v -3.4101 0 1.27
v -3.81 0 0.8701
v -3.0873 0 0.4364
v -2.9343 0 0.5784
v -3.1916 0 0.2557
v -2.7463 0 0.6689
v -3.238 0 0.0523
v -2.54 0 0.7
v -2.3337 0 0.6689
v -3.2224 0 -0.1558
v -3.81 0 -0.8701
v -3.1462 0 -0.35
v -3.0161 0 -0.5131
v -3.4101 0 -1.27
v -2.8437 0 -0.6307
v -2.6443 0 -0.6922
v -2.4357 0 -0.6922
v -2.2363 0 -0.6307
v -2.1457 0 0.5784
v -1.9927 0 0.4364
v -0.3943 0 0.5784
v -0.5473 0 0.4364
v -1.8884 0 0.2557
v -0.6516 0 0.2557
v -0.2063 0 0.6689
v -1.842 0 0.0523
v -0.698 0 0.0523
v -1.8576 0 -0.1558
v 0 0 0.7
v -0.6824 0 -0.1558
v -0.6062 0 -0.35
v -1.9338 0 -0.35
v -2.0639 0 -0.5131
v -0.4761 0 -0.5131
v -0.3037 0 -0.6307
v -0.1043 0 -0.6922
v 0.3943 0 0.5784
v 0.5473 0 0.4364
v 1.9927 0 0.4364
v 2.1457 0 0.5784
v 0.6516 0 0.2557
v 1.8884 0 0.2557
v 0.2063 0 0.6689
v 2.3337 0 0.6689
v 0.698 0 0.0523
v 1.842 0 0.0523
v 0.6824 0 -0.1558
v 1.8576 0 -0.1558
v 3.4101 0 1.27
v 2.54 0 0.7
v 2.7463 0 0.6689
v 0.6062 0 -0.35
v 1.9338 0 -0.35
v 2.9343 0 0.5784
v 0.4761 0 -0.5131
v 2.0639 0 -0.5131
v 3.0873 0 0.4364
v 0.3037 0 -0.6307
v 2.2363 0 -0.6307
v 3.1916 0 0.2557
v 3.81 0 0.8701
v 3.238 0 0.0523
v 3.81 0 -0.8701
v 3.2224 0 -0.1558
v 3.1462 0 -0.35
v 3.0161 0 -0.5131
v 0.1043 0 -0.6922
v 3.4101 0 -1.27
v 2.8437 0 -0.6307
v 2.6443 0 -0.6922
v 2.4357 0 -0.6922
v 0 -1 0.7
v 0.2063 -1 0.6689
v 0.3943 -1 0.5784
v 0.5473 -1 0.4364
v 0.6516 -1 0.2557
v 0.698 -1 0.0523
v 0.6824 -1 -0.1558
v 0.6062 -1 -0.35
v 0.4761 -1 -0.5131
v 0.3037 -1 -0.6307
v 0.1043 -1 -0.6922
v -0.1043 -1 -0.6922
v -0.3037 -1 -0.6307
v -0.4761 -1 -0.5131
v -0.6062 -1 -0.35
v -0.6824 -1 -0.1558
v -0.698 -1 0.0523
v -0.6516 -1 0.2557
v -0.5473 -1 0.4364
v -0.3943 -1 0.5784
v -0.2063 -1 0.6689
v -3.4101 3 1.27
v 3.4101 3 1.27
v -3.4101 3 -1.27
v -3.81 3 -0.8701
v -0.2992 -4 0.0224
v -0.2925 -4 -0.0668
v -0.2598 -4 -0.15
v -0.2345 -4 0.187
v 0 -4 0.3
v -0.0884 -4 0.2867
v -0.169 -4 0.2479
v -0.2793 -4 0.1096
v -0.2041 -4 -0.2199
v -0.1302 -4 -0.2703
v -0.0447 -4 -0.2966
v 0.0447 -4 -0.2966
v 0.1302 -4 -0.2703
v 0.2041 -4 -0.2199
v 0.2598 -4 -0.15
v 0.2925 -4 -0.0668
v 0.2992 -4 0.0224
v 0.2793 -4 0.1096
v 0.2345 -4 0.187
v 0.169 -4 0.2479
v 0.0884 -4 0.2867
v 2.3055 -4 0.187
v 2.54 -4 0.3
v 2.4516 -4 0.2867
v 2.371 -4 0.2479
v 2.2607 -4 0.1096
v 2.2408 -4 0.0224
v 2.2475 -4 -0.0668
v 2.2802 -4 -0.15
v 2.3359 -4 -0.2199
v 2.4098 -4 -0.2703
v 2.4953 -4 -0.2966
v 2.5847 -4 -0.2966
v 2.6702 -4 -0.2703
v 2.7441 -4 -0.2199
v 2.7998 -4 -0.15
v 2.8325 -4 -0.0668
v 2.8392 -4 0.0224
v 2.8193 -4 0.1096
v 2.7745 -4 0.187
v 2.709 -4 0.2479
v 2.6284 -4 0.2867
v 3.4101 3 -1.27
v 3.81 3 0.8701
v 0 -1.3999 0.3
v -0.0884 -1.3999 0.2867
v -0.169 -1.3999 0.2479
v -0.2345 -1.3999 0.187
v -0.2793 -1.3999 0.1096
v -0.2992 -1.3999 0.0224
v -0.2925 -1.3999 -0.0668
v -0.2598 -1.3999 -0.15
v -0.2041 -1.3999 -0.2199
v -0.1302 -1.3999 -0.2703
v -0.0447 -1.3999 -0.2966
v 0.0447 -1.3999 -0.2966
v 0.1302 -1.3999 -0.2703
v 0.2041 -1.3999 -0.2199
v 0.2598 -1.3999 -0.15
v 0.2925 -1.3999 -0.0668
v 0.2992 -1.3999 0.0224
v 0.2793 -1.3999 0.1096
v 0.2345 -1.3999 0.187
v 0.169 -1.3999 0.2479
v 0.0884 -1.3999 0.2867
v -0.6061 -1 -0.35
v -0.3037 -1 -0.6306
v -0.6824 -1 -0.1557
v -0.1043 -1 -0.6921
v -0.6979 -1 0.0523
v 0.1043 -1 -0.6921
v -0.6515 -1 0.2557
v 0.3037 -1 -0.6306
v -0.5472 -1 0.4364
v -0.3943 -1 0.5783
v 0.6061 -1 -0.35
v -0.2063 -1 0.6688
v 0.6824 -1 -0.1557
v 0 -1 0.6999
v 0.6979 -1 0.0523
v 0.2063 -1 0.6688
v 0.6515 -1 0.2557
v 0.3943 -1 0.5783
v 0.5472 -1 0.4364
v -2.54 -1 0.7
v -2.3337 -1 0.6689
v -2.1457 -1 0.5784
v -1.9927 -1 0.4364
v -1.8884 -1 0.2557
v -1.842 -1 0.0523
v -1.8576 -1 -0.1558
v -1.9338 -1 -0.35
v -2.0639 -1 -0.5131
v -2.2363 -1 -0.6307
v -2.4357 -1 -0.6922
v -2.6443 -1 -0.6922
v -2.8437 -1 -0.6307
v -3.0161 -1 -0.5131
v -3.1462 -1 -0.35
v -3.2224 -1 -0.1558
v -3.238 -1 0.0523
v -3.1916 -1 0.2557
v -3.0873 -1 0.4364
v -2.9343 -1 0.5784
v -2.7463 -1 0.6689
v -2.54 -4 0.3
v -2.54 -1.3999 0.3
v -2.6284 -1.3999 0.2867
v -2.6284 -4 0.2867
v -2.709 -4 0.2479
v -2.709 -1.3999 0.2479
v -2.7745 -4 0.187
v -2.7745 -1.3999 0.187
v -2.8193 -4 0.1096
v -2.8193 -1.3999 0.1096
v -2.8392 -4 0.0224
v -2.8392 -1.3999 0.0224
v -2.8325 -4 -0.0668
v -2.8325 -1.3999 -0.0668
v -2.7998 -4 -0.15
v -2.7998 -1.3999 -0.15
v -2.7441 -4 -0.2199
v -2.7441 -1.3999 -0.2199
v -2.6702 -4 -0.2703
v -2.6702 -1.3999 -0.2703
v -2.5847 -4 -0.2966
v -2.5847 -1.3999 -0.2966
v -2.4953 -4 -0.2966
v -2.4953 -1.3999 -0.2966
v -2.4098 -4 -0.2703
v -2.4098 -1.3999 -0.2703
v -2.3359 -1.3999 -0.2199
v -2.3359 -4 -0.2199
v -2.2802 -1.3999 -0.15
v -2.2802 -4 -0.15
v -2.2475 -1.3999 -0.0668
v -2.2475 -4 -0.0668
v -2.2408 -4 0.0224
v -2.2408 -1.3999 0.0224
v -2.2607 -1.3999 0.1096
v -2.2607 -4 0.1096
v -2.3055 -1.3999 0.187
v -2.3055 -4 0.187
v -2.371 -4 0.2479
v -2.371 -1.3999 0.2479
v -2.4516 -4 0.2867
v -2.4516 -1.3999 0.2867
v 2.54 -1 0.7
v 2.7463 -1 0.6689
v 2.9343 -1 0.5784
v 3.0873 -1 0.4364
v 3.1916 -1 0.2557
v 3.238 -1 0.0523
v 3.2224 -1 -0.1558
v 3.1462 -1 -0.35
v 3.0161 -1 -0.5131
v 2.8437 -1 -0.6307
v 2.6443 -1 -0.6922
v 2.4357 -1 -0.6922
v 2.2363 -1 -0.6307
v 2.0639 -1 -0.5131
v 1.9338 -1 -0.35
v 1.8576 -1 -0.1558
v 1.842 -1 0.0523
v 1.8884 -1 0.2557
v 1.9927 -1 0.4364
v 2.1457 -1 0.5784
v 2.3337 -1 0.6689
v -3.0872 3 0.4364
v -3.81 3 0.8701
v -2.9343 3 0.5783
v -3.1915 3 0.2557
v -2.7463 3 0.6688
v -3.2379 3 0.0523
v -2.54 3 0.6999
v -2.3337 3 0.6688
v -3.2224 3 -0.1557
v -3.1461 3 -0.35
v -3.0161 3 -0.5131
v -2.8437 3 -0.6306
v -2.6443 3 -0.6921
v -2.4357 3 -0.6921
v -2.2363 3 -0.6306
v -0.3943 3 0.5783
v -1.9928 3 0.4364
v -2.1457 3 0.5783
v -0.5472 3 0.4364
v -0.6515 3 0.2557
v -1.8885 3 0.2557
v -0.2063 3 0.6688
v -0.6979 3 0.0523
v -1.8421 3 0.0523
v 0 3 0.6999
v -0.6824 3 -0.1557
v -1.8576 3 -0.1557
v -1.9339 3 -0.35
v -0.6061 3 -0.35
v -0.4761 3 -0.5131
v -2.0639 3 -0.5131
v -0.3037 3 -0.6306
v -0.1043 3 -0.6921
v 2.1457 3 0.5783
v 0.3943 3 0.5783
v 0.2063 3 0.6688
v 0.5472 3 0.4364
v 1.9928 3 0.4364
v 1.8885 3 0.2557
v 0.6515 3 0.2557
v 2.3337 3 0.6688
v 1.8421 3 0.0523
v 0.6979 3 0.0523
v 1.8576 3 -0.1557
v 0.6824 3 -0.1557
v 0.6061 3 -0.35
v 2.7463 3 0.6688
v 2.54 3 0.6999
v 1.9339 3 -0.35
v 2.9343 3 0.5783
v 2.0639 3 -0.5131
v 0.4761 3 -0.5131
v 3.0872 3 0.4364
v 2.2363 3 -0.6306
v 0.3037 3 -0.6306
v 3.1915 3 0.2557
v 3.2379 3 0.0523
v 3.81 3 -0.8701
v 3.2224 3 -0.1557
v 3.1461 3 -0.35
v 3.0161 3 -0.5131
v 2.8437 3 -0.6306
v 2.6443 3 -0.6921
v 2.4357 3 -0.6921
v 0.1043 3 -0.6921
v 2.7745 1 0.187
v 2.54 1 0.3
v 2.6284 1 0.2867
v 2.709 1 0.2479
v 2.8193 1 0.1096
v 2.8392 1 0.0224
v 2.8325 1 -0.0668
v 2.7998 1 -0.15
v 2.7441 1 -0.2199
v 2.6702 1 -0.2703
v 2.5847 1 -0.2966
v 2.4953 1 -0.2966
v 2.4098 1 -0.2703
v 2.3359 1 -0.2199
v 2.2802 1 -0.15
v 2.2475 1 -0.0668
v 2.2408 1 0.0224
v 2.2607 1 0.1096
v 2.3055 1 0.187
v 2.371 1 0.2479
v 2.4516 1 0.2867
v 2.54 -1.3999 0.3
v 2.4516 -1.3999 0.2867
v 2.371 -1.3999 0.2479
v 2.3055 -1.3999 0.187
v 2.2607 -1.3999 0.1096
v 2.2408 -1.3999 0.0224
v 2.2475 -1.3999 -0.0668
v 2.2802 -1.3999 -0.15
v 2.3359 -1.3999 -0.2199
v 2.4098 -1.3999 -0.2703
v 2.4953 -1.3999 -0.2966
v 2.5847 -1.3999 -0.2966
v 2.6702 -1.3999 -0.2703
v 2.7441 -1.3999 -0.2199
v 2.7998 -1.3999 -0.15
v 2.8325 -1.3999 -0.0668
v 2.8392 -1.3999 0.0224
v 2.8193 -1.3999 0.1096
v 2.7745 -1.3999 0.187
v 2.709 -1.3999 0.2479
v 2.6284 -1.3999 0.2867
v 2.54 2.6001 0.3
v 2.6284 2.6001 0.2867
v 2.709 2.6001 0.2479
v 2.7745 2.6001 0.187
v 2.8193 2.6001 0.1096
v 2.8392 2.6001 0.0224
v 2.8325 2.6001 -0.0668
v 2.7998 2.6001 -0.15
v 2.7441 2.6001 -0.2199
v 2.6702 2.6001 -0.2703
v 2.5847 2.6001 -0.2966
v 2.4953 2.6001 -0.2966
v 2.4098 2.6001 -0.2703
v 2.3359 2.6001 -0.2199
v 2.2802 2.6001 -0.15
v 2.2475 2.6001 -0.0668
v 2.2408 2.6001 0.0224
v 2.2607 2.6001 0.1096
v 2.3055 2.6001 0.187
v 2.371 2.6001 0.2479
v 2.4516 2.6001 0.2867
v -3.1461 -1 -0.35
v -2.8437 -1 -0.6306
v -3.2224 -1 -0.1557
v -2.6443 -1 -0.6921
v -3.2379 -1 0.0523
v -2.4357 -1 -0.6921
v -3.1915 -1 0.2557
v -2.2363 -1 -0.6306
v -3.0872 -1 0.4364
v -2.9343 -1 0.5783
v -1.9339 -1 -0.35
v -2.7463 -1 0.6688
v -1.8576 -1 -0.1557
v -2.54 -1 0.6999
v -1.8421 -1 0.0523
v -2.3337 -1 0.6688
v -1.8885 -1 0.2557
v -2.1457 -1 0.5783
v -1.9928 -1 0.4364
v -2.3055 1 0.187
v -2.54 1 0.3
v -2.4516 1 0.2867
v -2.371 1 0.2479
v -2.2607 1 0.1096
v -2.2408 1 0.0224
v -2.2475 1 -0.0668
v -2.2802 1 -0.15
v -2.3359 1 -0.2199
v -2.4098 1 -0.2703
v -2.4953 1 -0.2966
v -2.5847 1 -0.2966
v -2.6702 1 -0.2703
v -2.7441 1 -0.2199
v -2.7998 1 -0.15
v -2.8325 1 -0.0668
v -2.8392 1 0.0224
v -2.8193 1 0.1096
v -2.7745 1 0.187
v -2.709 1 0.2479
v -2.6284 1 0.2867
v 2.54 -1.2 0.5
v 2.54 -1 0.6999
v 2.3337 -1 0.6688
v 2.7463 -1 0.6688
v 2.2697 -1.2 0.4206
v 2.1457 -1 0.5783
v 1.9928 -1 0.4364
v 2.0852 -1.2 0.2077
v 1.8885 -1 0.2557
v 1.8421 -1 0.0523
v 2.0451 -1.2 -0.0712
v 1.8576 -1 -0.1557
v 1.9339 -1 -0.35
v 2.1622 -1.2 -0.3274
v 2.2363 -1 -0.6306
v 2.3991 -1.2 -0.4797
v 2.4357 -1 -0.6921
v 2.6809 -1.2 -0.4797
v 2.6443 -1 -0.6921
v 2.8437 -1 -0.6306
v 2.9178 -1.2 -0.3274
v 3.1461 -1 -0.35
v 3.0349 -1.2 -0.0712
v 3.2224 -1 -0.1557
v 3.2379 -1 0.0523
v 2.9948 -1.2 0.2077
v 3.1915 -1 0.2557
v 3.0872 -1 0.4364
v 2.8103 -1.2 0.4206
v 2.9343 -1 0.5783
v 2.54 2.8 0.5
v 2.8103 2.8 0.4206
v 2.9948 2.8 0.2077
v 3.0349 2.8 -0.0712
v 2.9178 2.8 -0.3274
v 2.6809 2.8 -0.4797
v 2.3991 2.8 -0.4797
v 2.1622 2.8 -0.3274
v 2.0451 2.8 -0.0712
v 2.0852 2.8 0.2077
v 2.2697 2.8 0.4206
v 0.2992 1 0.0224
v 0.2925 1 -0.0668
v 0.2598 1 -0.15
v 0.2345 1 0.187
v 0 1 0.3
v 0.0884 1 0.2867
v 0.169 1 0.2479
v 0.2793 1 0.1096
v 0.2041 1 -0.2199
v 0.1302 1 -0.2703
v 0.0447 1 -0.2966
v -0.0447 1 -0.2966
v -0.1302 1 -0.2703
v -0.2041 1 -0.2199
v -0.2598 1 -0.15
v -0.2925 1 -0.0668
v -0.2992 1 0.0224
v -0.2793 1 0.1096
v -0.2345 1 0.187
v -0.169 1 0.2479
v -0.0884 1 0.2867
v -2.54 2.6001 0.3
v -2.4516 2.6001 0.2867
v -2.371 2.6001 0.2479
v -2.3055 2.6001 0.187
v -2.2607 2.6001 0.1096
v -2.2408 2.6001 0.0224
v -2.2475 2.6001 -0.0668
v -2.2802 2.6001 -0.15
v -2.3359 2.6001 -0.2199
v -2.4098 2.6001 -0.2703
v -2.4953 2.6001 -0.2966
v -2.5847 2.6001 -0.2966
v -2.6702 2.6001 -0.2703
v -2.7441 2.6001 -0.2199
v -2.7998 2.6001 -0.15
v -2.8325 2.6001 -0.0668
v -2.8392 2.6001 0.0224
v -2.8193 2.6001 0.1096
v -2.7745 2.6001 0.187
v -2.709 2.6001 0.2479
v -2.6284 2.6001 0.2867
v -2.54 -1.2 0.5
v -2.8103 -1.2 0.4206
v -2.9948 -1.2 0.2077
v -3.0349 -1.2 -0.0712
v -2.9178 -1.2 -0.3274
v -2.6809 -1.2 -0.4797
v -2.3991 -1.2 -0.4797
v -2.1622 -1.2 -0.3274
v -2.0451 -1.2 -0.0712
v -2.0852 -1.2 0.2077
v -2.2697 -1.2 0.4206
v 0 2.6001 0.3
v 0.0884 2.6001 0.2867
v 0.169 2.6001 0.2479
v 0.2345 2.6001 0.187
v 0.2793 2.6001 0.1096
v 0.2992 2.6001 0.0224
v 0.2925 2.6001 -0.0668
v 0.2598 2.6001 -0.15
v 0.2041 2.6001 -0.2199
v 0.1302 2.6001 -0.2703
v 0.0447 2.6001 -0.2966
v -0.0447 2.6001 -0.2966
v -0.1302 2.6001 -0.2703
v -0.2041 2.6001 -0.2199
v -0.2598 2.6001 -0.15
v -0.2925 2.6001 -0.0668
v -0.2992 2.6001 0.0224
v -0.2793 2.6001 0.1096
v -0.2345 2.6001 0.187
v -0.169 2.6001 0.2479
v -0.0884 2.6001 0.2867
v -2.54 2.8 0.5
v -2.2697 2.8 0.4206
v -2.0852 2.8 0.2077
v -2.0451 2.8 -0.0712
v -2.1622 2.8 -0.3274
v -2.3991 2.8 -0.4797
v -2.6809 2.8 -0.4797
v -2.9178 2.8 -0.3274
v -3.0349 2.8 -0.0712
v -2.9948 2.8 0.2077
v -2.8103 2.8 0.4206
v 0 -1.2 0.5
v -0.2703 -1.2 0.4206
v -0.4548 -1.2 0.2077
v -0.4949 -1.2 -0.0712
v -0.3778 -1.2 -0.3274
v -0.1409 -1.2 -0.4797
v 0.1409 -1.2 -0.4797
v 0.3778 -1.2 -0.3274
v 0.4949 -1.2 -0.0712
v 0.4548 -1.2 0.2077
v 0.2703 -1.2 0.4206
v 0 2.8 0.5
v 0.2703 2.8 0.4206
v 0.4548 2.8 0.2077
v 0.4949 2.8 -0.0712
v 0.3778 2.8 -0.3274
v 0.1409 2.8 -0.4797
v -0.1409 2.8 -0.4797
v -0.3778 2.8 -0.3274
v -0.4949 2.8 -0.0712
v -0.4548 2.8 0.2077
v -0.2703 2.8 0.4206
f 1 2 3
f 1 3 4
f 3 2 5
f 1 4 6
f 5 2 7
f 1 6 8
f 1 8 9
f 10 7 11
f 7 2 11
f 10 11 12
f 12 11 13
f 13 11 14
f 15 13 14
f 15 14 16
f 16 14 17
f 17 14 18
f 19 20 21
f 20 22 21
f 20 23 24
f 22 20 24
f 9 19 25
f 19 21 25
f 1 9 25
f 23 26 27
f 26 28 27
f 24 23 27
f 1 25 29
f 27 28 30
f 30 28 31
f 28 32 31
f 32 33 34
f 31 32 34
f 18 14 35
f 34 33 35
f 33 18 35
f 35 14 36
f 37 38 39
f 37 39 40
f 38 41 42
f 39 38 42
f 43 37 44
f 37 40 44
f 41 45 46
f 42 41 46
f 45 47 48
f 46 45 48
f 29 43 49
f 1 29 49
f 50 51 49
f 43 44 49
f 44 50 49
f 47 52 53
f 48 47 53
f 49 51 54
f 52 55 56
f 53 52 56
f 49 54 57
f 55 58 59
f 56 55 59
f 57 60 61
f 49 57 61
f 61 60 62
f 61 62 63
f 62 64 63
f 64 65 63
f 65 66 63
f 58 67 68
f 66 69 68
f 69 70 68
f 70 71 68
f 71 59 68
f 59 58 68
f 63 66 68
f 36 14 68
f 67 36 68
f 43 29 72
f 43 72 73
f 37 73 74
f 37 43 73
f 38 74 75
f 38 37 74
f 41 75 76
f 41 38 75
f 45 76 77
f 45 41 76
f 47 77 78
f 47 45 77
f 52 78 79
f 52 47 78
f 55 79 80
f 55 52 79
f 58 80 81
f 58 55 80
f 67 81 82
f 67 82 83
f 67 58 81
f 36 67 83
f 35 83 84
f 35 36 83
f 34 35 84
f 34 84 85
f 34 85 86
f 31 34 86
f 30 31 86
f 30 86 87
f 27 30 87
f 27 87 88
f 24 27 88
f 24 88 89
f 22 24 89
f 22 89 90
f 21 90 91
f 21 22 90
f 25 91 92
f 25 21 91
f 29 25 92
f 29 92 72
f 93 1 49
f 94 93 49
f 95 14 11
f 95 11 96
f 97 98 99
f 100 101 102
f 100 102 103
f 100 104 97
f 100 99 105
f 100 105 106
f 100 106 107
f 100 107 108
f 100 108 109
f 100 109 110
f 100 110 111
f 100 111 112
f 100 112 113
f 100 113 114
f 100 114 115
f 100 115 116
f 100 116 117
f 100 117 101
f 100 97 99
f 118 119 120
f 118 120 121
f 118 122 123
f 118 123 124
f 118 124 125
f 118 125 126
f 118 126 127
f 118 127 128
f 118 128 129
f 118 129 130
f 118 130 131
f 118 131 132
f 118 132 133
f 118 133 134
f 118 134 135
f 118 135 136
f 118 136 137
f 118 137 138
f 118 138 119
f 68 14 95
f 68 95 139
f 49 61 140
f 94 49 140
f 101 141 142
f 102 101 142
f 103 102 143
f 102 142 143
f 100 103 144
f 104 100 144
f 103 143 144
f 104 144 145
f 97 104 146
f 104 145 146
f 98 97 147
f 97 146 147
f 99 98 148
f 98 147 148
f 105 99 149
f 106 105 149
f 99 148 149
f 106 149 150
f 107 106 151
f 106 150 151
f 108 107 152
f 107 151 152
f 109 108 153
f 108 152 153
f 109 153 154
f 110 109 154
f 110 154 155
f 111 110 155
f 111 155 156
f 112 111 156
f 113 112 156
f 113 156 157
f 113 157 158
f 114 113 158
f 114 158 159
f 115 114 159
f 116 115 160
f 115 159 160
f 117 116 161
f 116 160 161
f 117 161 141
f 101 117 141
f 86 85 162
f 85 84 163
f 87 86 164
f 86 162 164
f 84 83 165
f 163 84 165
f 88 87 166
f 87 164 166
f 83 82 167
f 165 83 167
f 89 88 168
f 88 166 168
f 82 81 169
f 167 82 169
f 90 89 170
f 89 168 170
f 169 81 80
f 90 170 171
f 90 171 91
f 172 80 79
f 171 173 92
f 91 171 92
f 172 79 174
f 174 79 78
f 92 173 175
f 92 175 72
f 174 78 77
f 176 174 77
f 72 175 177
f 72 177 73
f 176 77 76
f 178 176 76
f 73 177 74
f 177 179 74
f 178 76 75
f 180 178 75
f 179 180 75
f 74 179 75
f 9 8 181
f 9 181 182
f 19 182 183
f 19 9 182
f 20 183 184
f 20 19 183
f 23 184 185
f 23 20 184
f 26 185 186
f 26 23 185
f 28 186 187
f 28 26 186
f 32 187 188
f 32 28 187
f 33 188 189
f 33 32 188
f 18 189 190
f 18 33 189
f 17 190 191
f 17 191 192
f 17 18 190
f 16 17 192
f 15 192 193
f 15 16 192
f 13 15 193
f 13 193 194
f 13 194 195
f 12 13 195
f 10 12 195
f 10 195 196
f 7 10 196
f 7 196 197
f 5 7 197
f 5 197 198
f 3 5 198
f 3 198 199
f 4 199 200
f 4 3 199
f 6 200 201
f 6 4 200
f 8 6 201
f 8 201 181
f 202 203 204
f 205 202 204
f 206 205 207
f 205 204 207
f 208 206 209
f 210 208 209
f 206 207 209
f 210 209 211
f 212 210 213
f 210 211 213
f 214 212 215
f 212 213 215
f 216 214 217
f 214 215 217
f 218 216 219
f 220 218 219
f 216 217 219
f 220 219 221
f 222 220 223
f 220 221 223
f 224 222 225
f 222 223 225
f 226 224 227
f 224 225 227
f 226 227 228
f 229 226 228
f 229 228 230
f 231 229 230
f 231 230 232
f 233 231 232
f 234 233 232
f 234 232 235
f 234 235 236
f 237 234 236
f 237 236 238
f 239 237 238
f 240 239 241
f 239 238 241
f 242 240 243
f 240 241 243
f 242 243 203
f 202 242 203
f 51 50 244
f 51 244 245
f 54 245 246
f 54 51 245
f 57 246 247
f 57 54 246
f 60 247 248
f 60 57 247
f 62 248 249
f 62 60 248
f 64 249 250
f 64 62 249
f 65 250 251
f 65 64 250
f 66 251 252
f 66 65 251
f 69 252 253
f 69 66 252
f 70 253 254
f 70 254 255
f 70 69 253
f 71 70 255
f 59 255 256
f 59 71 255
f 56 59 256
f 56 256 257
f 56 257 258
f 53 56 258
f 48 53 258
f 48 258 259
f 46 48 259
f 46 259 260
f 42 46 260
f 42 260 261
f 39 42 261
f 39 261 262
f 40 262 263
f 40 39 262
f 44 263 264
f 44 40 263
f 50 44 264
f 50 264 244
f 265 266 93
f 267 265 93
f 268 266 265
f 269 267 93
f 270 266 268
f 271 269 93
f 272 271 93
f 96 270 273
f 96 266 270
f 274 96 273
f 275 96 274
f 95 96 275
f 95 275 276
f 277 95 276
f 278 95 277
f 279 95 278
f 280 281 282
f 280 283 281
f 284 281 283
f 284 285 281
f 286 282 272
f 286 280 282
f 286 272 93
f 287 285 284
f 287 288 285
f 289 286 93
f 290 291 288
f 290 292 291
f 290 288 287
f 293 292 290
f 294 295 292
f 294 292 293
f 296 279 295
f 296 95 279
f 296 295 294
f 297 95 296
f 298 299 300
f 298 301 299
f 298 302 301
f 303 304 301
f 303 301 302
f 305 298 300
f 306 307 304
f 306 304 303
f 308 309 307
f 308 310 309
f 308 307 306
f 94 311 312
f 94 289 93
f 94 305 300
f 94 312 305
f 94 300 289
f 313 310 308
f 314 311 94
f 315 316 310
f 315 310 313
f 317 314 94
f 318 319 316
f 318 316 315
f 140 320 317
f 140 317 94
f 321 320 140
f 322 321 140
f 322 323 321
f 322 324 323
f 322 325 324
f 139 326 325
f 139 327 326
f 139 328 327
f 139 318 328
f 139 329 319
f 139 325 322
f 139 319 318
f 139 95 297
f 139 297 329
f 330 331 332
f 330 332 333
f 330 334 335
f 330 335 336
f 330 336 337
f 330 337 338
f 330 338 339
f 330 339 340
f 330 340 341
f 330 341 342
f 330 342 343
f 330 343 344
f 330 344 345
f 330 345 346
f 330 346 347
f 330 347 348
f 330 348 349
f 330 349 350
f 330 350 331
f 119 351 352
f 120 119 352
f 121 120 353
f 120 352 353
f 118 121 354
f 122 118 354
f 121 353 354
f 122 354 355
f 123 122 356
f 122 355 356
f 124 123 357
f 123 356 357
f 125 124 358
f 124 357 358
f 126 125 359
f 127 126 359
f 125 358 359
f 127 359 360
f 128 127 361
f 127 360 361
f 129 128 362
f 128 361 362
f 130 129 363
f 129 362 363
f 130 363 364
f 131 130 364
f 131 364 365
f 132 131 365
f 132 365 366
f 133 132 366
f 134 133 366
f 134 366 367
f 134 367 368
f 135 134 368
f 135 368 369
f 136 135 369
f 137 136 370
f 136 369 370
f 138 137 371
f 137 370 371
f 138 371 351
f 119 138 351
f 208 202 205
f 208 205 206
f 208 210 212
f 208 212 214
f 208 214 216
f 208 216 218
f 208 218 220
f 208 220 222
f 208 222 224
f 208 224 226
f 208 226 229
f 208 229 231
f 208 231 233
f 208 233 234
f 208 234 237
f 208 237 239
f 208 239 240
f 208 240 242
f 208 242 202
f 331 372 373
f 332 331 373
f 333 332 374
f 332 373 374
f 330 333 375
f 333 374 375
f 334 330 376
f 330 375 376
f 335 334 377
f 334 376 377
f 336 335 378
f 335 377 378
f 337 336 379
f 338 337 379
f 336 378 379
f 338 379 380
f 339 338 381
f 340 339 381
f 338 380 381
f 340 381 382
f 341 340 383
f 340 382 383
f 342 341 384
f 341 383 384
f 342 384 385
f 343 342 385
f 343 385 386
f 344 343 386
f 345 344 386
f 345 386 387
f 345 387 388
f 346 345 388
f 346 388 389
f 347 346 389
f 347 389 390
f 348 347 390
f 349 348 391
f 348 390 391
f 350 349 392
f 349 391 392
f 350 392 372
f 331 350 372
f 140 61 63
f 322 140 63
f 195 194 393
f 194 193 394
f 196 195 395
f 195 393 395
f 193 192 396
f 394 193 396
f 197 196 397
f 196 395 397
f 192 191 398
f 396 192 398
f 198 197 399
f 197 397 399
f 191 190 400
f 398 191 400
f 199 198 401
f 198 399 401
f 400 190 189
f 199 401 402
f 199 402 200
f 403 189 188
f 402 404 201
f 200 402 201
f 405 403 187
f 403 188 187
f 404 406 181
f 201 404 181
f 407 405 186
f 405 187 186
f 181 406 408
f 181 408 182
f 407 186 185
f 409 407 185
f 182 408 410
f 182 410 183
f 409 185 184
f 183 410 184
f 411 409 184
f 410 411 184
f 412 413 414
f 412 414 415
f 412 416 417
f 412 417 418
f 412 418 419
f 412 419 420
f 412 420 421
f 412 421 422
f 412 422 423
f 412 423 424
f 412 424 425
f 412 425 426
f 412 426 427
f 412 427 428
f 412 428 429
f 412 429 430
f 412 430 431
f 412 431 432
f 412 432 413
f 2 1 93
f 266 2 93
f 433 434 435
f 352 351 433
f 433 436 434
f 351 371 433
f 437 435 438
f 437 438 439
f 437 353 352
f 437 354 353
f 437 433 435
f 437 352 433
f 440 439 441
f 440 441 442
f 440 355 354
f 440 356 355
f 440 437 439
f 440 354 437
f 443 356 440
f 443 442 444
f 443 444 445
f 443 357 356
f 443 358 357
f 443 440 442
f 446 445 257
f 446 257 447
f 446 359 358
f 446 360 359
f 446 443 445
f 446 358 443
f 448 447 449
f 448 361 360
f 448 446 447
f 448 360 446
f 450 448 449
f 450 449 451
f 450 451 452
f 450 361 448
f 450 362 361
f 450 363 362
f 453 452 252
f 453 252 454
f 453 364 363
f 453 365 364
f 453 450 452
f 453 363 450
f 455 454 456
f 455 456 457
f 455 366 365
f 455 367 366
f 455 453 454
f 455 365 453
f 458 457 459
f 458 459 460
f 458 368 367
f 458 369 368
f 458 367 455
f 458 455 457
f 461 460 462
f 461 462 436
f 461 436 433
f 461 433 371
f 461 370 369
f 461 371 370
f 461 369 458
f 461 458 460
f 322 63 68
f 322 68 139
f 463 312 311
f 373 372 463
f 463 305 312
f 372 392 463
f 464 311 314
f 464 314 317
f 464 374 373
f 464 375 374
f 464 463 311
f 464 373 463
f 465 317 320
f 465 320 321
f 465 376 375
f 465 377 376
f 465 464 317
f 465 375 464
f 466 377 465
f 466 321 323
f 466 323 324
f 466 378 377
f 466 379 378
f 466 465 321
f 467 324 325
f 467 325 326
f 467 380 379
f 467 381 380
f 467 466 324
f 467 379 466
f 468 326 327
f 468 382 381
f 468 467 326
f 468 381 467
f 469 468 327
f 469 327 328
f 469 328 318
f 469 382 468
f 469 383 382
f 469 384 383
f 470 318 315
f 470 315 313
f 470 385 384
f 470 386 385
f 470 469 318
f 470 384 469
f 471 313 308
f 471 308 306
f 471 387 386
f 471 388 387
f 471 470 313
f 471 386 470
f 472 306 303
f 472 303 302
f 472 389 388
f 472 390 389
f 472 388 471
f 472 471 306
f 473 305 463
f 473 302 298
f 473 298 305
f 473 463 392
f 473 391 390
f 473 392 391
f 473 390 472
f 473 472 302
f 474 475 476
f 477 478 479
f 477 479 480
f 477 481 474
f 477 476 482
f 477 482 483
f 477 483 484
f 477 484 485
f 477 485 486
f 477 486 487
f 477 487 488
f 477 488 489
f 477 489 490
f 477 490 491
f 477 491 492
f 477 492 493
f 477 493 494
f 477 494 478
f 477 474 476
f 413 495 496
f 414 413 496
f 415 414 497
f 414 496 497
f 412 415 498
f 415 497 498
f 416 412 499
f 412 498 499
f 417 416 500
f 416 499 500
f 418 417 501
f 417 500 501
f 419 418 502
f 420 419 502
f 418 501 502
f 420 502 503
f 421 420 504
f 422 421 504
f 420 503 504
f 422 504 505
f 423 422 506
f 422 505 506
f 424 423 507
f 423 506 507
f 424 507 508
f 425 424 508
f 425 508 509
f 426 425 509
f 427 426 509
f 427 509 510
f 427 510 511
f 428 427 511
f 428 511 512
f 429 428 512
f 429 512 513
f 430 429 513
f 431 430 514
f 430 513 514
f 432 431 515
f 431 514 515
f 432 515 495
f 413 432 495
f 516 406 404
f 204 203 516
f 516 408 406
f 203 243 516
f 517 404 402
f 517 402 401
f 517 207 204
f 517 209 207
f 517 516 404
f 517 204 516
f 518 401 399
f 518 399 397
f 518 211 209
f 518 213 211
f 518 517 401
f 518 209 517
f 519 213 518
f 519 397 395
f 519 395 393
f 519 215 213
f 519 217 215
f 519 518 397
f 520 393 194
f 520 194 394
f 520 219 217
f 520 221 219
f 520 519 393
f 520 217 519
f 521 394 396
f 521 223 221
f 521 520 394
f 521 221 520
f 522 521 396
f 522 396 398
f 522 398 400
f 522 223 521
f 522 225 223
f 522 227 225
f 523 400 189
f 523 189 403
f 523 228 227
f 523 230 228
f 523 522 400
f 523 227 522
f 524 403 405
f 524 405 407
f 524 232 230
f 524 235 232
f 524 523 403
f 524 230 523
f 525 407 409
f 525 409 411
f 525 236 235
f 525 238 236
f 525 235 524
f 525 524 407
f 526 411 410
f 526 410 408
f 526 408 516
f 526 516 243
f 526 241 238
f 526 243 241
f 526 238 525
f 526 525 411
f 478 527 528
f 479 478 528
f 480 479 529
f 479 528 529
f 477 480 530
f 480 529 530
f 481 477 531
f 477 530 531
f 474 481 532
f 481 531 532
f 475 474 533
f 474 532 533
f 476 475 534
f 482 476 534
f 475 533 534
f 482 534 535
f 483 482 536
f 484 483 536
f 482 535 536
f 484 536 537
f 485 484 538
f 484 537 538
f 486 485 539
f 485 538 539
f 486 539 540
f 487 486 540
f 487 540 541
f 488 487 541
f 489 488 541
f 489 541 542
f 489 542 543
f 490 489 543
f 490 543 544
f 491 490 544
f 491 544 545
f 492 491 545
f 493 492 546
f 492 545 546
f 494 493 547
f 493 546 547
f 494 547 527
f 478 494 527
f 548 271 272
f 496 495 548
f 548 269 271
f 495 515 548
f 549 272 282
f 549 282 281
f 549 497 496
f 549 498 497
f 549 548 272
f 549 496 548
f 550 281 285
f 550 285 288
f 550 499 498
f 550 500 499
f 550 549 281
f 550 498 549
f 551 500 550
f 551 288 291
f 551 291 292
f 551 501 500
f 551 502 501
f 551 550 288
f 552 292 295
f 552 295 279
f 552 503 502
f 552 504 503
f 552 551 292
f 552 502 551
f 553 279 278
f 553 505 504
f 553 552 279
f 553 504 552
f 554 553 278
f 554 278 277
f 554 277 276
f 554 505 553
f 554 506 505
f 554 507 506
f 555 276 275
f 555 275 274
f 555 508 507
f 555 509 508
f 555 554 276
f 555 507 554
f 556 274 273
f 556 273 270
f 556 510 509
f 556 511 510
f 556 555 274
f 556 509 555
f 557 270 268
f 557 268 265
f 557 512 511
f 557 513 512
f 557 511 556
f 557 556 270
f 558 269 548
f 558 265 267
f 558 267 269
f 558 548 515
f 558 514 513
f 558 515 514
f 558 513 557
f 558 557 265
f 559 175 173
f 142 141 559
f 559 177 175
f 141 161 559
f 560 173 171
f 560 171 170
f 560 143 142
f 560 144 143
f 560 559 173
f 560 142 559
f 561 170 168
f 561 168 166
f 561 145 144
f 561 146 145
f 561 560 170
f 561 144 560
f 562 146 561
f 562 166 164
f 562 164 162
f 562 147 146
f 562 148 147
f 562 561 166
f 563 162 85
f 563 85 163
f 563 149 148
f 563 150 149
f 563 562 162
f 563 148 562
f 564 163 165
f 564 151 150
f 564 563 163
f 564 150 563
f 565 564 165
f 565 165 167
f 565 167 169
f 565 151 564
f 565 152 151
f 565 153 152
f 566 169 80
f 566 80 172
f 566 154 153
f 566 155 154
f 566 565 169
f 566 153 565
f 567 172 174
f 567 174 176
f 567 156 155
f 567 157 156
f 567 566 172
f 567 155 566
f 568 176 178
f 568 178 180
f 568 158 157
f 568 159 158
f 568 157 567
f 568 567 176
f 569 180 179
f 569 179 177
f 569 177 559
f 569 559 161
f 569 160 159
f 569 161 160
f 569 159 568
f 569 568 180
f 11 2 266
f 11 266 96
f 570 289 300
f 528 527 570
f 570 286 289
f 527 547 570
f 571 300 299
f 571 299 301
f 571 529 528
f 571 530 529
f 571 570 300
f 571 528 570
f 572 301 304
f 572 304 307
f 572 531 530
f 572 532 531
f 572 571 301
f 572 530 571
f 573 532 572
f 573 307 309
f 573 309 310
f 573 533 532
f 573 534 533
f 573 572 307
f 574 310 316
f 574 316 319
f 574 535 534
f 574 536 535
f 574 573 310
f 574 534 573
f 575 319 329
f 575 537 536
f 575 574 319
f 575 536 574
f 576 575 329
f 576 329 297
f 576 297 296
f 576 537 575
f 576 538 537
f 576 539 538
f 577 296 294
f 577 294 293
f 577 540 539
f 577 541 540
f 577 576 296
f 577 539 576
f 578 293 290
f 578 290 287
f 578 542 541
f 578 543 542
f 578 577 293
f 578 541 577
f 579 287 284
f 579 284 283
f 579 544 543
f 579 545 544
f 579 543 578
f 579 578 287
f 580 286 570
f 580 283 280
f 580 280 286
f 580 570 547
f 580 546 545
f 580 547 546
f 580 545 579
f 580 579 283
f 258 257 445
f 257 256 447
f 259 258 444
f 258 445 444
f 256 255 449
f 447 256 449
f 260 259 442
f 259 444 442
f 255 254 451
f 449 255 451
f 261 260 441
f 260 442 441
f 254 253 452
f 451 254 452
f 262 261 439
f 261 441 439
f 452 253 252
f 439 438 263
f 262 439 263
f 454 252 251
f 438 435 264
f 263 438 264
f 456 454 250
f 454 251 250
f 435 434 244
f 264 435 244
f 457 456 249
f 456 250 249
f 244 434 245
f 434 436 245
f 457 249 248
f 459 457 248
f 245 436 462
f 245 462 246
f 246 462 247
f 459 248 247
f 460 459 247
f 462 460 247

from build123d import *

# Parameters (mm, degrees)
ESQUISSE1_W             = 7.62
ESQUISSE1_H             = 2.54
BOSS_EXTRU_1_DEPTH      = 3
ESQUISSE2_R             = 0.3
ENL_V_MAT_EXTRU_1_DEPTH = 2
ESQUISSE3_R             = 0.7
BOSS_EXTRU_2_DEPTH      = 1
ESQUISSE4_R             = 0.3
BOSS_EXTRU_3_DEPTH      = 3
CHANFREIN1_SIZE         = 0.4


with BuildPart() as part:
    # Esquisse1 → Boss.-Extru.1 (new body)
    with BuildSketch(Plane(origin=(0, 0, 0), x_dir=(1, 0, 0), z_dir=(0, 1, 0))):
        Rectangle(ESQUISSE1_W, ESQUISSE1_H)
    extrude(amount=BOSS_EXTRU_1_DEPTH)

    # Esquisse2 → Enlèv. mat.-Extru.1 (cut)
    with BuildSketch(Plane(origin=(0, 3, 0), x_dir=(1, 0, 0), z_dir=(0, 1, 0))):
        with Locations(Location((-2.54, 0, 0), (0, 0, 270))):
            Circle(ESQUISSE2_R)
        with Locations(Location((0, 0, 0), (0, 0, 270))):
            Circle(ESQUISSE2_R)
        with Locations(Location((2.54, 0, 0), (0, 0, 270))):
            Circle(ESQUISSE2_R)
    extrude(amount=-ENL_V_MAT_EXTRU_1_DEPTH, mode=Mode.SUBTRACT)

    # Esquisse3 → Boss.-Extru.2 (add)
    with BuildSketch(Plane(origin=(0, 0, 0), x_dir=(1, 0, 0), z_dir=(0, 1, 0))):
        with Locations(Location((-2.54, 0, 0), (0, 0, 270))):
            Circle(ESQUISSE3_R)
        with Locations(Location((0, 0, 0), (0, 0, 270))):
            Circle(ESQUISSE3_R)
        with Locations(Location((2.54, 0, 0), (0, 0, 270))):
            Circle(ESQUISSE3_R)
    extrude(amount=-BOSS_EXTRU_2_DEPTH)

    # Esquisse4 → Boss.-Extru.3 (add)
    with BuildSketch(Plane.XZ.offset(1)):
        with Locations(Location((-2.54, 0, 0), (0, 0, 90))):
            Circle(ESQUISSE4_R)
        with Locations(Location((0, 0, 0), (0, 0, 90))):
            Circle(ESQUISSE4_R)
        with Locations(Location((2.54, 0, 0), (0, 0, 90))):
            Circle(ESQUISSE4_R)
    extrude(amount=BOSS_EXTRU_3_DEPTH)

    # Chanfrein1
    chanfrein1_edges = [part.edges().sort_by_distance(p)[0] for p in [
        (-2.54, 3, -0.3),
        (2.54, 3, -0.3),
        (0, 3, -0.3),
        (-2.54, -1, -0.3),
        (0, -1, -0.3),
        (2.54, -1, -0.3),
        (-3.81, 1.5, -1.27),
        (3.81, 1.5, -1.27),
        (3.81, 1.5, 1.27),
        (-3.81, 1.5, 1.27),
    ]]
    chamfer(chanfrein1_edges, length=CHANFREIN1_SIZE - 0.0001)  # a hair under: the kernel refuses the full size


solid = part.part
